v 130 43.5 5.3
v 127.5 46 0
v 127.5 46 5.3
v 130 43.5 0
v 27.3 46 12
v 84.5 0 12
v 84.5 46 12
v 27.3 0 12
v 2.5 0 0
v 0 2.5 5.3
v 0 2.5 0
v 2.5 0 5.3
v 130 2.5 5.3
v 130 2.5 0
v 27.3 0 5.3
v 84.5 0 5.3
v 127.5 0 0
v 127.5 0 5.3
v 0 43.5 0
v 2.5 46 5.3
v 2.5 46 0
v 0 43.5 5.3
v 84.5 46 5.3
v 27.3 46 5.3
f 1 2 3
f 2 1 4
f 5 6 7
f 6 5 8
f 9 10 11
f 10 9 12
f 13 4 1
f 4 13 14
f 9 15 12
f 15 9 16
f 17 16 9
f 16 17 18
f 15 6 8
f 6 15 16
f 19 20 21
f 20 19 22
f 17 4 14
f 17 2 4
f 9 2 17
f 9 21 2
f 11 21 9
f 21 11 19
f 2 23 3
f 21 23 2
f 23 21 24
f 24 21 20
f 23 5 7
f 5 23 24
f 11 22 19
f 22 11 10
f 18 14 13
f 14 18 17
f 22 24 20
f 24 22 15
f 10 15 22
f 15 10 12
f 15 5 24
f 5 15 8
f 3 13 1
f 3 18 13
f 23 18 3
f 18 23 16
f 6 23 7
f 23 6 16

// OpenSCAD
$fn = 32;

// ----------------------------------------------------------------------
// Stepped bar: centerstep, 130 x 46 x 12/5.3 mm
// ----------------------------------------------------------------------

// --- parameters (mm) ---
bar_l = 130;              // bar length, X
bar_w = 46;               // bar width, Y
plate_t = 12;             // thickness of the thick zone, Z
thin_t = 5.3;             // thickness of the thin zone
corner_c = 2.5;           // corner chamfer of the bar
step_cut = 6.7;           // material removed from the thin zone
thick_from = 27.3;        // start of the thick middle zone
thick_to = 84.5;          // end of the thick middle zone
depth_1 = 6.7;            // depth of cut 1 from the top face
depth_2 = 6.7;            // depth of cut 2 from the top face

profile = [[2.5, 0], [127.5, 0], [130, 2.5], [130, 43.5], [127.5, 46], [2.5, 46], [0, 43.5], [0, 2.5]];  // primary outline, 8 points, counter clockwise
void_1 = [[-1, -1], [27.3, -1], [27.3, 47], [-1, 47]];  // thin left end, 4 points
void_2 = [[84.5, -1], [131, -1], [131, 47], [84.5, 47]];  // thin right end, 4 points

// --- the one profile operation ---
difference() {
  linear_extrude(height = plate_t) polygon(points = profile);
  translate([0, 0, plate_t - depth_1])
    linear_extrude(height = depth_1 + 1) polygon(points = void_1);
  translate([0, 0, plate_t - depth_2])
    linear_extrude(height = depth_2 + 1) polygon(points = void_2);
}
